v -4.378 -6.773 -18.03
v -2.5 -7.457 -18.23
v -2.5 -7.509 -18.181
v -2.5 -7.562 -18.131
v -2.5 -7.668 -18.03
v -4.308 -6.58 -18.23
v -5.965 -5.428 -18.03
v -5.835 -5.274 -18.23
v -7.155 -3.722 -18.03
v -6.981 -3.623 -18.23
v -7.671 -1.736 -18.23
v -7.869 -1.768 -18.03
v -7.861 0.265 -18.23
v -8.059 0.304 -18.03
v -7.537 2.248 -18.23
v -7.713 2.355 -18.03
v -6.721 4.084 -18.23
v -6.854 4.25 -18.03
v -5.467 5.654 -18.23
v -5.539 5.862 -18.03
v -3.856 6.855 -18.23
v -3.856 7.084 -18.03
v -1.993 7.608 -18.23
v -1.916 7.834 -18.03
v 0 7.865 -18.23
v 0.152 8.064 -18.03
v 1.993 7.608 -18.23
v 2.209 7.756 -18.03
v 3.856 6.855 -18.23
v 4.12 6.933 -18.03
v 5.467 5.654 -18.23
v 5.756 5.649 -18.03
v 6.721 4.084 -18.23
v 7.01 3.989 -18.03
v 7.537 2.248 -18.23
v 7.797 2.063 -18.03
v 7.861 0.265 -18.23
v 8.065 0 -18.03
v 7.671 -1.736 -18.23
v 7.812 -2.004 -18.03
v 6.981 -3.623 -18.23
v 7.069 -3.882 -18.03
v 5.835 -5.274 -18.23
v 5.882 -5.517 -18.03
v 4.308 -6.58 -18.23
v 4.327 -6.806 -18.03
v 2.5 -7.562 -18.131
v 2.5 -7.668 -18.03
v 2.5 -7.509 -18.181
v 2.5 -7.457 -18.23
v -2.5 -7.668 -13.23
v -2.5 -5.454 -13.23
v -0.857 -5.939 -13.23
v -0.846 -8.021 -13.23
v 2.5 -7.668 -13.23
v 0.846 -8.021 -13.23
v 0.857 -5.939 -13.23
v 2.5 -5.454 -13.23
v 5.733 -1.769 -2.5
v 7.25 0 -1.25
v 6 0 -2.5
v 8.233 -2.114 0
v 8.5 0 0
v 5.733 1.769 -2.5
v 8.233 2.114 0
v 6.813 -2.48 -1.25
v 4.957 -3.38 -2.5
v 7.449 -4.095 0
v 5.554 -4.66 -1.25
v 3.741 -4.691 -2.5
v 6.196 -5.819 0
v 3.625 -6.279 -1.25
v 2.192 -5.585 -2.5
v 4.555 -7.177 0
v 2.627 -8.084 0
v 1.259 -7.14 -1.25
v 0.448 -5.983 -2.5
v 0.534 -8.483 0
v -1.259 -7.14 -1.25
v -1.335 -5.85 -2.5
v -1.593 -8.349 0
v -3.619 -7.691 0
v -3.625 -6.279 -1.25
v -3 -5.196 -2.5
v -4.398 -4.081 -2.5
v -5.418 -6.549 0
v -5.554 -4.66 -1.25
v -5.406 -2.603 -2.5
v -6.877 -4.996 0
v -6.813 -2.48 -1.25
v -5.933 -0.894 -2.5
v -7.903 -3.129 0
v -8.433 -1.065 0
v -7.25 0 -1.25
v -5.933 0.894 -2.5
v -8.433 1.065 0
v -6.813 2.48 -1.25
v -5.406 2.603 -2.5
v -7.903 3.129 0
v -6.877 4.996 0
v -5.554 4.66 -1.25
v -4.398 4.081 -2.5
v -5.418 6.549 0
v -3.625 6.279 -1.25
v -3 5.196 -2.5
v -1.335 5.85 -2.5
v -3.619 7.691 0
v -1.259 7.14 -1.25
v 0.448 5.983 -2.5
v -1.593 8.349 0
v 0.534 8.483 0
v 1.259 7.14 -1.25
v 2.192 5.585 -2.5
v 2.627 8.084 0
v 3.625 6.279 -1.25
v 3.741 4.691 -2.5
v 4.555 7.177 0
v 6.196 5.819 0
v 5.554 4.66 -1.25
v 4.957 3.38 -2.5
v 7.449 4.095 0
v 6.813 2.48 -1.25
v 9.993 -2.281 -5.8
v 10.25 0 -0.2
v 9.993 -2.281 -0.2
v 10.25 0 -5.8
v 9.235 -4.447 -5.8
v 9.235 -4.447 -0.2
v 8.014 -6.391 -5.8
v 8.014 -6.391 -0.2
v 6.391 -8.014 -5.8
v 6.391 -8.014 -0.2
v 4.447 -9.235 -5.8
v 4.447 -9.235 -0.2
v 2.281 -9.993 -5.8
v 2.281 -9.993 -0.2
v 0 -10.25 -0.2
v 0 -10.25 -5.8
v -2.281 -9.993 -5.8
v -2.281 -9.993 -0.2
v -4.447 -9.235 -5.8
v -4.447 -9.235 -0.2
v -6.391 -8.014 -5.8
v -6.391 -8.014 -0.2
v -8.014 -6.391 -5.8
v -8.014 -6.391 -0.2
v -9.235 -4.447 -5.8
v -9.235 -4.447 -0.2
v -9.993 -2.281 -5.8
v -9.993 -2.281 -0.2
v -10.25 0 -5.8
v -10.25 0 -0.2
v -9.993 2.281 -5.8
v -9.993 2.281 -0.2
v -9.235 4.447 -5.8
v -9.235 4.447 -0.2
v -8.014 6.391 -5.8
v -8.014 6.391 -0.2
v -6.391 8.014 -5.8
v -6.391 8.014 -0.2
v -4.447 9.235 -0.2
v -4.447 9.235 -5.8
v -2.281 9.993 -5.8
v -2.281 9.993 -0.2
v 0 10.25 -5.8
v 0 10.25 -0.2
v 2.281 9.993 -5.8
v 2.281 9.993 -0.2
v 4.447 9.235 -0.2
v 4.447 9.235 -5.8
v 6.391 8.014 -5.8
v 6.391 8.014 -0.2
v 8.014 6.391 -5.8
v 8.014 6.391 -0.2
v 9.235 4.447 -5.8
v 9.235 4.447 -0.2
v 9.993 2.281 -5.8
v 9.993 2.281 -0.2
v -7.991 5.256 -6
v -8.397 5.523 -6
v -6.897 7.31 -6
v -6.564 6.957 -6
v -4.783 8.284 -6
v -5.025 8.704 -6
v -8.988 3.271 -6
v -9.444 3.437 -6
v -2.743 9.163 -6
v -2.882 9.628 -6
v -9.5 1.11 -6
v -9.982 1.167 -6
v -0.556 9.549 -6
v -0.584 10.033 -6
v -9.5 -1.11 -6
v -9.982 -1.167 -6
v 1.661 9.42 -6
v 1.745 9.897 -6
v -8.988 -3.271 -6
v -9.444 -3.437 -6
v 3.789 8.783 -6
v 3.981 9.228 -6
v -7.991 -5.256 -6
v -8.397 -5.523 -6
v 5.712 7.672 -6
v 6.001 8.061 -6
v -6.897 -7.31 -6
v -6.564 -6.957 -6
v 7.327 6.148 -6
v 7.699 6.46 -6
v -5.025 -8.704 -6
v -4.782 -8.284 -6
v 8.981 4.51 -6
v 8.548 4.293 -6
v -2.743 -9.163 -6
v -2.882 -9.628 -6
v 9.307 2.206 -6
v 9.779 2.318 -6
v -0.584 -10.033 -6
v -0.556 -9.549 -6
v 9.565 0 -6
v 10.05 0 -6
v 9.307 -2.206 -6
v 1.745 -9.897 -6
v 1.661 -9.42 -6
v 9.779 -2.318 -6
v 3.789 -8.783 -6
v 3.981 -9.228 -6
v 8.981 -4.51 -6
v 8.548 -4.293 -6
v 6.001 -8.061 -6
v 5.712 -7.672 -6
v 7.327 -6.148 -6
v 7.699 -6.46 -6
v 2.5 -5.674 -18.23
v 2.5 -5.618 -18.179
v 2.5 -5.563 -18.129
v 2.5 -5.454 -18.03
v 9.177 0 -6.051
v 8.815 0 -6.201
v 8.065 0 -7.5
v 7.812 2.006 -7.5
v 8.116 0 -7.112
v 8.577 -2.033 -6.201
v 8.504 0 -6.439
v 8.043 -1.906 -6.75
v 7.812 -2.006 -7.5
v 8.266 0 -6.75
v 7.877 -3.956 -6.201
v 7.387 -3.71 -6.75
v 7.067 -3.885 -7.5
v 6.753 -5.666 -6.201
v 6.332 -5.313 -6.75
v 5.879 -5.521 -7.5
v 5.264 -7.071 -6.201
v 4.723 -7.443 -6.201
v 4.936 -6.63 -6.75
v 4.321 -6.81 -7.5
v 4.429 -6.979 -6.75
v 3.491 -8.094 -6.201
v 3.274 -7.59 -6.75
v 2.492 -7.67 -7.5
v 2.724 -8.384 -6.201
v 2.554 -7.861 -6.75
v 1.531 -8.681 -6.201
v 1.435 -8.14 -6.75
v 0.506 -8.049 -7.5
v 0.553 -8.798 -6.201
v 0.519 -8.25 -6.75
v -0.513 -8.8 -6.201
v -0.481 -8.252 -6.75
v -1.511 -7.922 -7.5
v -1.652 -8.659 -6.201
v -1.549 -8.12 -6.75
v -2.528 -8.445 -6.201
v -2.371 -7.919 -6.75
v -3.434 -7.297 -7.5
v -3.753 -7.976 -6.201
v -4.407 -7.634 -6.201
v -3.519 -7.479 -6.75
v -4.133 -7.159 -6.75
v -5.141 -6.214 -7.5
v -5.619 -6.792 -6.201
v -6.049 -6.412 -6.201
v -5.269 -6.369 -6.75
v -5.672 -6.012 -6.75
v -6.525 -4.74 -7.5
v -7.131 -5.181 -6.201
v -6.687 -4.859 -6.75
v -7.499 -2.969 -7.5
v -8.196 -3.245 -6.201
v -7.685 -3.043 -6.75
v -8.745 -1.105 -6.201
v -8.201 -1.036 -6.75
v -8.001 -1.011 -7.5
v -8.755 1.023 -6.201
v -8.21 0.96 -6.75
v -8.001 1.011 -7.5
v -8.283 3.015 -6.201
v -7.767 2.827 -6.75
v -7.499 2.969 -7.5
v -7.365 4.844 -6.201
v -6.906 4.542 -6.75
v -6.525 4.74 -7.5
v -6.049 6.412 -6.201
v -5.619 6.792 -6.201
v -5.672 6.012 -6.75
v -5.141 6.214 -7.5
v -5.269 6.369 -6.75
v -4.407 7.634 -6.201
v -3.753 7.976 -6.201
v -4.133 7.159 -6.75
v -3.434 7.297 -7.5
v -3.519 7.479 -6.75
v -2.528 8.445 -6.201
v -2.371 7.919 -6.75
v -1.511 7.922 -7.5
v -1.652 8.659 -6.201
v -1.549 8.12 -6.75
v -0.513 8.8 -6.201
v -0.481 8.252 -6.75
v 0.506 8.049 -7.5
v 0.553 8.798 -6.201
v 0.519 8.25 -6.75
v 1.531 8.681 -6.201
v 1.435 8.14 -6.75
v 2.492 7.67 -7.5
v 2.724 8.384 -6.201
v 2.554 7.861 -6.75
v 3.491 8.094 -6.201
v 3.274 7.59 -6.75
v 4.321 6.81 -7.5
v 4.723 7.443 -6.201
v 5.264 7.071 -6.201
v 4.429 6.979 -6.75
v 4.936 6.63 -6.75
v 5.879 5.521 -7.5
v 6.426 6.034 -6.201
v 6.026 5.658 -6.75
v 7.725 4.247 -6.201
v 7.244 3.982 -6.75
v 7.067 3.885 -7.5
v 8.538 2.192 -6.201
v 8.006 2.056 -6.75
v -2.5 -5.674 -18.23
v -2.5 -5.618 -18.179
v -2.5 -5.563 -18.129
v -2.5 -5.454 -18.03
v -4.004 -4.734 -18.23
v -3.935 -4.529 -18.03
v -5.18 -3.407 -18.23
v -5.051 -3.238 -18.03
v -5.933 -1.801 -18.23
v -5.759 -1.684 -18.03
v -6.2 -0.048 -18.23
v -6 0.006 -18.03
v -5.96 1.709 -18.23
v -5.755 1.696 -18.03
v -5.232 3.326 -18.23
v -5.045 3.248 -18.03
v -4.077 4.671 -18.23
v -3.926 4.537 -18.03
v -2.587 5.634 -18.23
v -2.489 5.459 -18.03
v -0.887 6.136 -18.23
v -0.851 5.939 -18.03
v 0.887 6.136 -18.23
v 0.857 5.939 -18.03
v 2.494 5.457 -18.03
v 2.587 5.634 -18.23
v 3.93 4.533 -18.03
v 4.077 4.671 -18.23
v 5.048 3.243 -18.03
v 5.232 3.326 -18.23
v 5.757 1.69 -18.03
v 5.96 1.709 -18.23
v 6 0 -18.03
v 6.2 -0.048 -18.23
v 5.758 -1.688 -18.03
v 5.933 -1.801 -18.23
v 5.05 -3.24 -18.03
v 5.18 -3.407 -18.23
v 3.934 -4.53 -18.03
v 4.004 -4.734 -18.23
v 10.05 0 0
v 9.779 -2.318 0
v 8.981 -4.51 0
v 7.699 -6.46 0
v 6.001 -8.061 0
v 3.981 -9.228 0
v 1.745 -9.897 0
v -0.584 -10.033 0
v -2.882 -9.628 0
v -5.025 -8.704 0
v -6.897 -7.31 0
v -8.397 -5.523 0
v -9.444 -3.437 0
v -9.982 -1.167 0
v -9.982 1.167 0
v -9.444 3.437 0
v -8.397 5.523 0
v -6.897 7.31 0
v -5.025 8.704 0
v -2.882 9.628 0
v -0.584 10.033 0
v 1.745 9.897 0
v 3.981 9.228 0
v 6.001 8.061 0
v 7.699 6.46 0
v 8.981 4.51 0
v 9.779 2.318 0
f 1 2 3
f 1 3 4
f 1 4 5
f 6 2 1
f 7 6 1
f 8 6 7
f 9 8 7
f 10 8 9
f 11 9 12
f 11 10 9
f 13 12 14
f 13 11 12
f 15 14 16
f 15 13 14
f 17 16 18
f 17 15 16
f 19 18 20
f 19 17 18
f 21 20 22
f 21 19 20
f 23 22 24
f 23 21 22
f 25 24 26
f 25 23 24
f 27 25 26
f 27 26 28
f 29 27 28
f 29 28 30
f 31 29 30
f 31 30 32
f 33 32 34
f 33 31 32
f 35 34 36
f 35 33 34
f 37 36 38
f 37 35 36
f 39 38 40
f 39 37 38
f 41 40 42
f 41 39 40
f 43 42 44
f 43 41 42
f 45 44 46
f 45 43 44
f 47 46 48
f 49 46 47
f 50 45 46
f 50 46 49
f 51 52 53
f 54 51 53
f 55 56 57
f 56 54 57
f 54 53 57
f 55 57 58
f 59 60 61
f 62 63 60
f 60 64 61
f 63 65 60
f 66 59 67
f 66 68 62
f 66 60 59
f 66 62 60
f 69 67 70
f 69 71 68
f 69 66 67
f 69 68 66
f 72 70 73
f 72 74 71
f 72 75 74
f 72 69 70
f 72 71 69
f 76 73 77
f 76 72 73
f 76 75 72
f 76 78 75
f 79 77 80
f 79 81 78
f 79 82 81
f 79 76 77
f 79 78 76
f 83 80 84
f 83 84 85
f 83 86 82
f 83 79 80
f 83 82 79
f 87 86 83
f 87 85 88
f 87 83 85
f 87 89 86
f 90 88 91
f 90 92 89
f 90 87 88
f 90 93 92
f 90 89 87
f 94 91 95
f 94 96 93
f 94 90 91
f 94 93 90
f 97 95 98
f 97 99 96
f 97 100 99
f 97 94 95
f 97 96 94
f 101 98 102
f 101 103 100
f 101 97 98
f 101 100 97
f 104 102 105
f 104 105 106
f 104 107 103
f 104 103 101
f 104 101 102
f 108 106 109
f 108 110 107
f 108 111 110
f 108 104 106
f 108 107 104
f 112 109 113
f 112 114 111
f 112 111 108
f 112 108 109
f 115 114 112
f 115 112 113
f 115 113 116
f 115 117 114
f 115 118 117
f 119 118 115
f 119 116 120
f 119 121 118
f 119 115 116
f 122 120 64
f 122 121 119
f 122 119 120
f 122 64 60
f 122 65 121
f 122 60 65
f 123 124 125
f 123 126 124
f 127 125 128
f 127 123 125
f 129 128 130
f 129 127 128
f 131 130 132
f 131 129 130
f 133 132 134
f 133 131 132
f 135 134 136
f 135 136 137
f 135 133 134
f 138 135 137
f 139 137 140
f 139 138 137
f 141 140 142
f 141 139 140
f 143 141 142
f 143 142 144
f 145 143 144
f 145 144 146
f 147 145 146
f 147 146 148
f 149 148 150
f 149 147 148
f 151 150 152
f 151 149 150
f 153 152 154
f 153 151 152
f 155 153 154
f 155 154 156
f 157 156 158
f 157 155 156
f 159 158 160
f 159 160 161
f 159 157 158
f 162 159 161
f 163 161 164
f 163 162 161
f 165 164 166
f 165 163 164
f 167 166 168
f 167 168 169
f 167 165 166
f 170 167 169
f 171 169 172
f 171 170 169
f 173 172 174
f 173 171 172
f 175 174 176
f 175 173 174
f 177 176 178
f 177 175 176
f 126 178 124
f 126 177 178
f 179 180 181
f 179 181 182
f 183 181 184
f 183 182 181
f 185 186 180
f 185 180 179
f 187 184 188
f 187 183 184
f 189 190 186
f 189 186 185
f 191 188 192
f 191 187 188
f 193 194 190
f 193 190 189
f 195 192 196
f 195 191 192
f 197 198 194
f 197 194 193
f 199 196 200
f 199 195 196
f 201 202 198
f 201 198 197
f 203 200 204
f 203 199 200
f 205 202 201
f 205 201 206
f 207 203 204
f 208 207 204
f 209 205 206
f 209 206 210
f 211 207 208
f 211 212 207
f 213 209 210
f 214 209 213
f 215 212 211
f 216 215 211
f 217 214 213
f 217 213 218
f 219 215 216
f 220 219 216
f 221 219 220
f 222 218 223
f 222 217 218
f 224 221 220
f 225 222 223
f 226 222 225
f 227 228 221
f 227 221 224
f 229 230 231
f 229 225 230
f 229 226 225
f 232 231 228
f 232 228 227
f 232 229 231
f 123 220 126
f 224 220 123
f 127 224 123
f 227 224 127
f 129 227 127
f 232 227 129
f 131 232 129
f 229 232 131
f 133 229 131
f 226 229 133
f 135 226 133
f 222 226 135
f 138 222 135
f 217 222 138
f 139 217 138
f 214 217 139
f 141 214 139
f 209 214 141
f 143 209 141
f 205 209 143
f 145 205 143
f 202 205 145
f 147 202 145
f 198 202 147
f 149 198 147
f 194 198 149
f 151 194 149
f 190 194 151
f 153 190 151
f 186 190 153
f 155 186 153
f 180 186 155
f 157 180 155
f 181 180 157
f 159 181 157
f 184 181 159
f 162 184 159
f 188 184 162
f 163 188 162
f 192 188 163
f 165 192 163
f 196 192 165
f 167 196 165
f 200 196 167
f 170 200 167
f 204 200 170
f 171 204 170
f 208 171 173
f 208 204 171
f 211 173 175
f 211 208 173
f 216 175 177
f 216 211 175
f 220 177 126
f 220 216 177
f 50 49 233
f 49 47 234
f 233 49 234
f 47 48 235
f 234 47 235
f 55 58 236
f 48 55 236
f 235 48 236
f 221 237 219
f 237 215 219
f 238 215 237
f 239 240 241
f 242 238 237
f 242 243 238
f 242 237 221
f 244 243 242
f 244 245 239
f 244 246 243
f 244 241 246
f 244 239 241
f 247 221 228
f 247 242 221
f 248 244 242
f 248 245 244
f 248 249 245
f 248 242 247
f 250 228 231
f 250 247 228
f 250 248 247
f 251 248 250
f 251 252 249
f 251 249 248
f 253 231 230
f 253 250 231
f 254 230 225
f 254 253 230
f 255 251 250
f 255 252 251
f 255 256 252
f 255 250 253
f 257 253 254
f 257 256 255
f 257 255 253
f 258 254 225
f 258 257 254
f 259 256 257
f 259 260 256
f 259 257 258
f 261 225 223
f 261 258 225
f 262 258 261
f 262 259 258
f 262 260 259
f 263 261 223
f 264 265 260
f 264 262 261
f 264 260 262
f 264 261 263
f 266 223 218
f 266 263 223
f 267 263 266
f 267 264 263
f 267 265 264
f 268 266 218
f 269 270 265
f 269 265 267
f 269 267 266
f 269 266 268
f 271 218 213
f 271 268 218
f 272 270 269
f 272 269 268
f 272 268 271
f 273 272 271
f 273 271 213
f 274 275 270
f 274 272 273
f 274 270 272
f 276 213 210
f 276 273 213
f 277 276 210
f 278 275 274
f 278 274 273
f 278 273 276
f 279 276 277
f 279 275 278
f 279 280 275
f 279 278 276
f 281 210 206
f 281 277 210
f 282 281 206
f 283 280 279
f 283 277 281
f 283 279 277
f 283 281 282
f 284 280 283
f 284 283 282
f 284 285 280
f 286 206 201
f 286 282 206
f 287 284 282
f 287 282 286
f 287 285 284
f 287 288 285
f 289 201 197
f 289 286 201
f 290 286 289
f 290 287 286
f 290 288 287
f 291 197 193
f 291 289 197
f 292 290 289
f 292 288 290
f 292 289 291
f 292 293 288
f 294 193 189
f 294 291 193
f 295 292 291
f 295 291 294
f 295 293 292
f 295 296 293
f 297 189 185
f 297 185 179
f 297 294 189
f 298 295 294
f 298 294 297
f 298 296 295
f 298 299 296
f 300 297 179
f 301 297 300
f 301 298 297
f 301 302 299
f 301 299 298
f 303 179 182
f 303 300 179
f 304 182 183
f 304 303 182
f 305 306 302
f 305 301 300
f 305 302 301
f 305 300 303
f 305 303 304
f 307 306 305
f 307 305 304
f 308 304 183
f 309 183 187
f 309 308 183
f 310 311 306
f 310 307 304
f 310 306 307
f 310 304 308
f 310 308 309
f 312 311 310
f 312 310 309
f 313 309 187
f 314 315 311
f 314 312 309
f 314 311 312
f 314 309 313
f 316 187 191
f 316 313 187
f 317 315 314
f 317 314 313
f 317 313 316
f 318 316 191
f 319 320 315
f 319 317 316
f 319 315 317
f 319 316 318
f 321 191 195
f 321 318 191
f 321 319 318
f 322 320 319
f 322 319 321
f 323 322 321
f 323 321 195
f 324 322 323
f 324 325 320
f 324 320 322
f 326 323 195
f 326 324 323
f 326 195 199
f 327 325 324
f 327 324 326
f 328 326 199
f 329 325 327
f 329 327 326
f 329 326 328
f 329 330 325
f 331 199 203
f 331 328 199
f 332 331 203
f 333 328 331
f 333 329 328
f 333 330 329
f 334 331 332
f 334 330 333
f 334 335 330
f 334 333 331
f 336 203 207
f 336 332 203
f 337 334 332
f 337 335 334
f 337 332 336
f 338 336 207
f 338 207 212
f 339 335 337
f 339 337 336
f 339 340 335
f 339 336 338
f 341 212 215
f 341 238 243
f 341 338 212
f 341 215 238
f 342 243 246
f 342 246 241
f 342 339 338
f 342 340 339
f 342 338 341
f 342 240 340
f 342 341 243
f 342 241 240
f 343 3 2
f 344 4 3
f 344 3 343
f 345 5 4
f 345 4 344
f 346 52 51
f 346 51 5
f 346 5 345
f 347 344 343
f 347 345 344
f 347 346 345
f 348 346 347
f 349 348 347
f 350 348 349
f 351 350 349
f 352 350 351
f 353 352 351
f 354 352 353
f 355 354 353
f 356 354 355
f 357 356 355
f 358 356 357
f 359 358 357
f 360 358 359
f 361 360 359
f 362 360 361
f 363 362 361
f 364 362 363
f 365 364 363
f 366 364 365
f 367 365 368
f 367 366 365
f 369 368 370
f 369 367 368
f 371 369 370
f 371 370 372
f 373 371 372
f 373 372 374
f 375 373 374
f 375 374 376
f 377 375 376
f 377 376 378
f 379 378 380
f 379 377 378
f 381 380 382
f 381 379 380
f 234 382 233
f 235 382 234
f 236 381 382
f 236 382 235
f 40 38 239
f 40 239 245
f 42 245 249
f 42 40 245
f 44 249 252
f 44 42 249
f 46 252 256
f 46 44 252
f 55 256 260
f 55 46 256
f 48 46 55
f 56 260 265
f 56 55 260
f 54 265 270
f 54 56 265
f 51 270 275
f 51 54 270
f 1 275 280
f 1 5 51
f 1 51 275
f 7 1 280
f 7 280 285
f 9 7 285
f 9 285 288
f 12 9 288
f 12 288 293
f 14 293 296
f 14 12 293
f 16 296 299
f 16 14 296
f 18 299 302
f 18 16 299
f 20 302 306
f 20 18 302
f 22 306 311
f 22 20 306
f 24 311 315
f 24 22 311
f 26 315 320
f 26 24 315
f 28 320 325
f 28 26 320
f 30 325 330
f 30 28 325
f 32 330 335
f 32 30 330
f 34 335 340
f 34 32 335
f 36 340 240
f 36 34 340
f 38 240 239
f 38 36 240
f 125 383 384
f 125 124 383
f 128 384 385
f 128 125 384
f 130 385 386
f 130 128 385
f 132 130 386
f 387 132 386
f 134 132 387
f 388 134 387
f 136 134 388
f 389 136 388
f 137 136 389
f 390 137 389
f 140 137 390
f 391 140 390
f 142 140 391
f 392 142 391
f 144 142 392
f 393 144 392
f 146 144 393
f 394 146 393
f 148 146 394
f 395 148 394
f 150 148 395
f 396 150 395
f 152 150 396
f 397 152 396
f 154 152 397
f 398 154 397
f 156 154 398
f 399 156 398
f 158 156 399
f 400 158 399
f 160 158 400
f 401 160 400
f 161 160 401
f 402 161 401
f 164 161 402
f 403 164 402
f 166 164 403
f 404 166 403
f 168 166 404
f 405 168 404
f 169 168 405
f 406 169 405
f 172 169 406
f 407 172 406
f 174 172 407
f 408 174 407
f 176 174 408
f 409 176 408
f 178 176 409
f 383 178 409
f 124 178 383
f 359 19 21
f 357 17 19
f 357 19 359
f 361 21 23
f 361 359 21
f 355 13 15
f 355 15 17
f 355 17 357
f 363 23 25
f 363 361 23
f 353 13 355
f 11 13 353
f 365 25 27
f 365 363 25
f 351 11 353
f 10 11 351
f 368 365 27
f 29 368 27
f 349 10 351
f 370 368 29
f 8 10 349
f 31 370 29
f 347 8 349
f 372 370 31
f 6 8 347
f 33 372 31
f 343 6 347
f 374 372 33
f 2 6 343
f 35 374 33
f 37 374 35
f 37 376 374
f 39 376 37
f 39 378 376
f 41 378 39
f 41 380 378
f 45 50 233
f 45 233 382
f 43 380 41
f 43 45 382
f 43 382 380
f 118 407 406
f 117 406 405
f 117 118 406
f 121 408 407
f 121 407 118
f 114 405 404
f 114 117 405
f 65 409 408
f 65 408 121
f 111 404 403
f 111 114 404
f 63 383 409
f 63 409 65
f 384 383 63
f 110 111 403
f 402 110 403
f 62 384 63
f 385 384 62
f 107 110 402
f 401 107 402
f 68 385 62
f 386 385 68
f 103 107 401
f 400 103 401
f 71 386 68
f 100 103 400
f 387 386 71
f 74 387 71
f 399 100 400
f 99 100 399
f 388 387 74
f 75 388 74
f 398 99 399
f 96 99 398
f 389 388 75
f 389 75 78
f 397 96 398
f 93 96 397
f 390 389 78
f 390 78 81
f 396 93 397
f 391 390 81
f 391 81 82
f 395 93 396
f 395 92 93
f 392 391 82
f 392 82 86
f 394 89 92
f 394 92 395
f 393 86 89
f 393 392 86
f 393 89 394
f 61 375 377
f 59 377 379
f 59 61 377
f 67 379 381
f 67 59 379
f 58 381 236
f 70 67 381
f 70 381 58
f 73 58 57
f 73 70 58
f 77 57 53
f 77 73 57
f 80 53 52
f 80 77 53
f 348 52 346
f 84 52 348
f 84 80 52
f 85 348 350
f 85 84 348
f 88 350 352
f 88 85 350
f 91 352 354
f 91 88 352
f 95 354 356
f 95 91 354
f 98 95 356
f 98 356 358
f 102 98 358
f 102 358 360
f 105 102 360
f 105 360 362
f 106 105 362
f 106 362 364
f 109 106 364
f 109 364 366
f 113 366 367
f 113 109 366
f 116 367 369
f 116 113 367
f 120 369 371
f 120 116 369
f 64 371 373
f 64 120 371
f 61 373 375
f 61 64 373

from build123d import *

# Parameters (mm, degrees)
CROQUIS2_W            = 5
CROQUIS2_H            = 5
CORTAR_EXTRUIR1_DEPTH = 24.290725622


with BuildPart() as part:
    # Croquis1 → Revolución1 (revolve)
    with BuildSketch(Plane(origin=(0, 0, 0), x_dir=(0, 0, -1), z_dir=(1, 0, 0)), mode=Mode.PRIVATE) as revoluci_n1_sk:
        with BuildLine():
            Line((0, 8.5), (0, 10.05))
            Line((0, 10.05), (0.2, 10.25))
            Line((0.2, 10.25), (5.8, 10.25))
            Line((5.8, 10.25), (6, 10.05))
            Line((6, 10.05), (6, 9.565))
            ThreePointArc((6, 9.565), (6.439339828, 8.504339828), (7.5, 8.065))
            Line((7.5, 8.065), (18.03, 8.065))
            Line((18.03, 8.065), (18.23, 7.865))
            Line((18.23, 7.865), (18.23, 6.2))
            Line((18.23, 6.2), (18.03, 6))
            Line((18.03, 6), (2.5, 6))
            Line((2.5, 6), (0, 8.5))
        make_face()
    revolve(revoluci_n1_sk.sketch.rotate(Axis((0, 0, 0), (0, 0, -1)), 90), axis=Axis((0, 0, 0), (0, 0, -1)))

    # Croquis2 → Cortar-Extruir1 (cut, through all)
    with BuildSketch(Plane(origin=(0, 0, 0), x_dir=(1, 0, 0), z_dir=(0, 1, 0))):
        with Locations((0, 15.73)):
            Rectangle(CROQUIS2_W, CROQUIS2_H)
    extrude(amount=-CORTAR_EXTRUIR1_DEPTH, mode=Mode.SUBTRACT)


solid = part.part
